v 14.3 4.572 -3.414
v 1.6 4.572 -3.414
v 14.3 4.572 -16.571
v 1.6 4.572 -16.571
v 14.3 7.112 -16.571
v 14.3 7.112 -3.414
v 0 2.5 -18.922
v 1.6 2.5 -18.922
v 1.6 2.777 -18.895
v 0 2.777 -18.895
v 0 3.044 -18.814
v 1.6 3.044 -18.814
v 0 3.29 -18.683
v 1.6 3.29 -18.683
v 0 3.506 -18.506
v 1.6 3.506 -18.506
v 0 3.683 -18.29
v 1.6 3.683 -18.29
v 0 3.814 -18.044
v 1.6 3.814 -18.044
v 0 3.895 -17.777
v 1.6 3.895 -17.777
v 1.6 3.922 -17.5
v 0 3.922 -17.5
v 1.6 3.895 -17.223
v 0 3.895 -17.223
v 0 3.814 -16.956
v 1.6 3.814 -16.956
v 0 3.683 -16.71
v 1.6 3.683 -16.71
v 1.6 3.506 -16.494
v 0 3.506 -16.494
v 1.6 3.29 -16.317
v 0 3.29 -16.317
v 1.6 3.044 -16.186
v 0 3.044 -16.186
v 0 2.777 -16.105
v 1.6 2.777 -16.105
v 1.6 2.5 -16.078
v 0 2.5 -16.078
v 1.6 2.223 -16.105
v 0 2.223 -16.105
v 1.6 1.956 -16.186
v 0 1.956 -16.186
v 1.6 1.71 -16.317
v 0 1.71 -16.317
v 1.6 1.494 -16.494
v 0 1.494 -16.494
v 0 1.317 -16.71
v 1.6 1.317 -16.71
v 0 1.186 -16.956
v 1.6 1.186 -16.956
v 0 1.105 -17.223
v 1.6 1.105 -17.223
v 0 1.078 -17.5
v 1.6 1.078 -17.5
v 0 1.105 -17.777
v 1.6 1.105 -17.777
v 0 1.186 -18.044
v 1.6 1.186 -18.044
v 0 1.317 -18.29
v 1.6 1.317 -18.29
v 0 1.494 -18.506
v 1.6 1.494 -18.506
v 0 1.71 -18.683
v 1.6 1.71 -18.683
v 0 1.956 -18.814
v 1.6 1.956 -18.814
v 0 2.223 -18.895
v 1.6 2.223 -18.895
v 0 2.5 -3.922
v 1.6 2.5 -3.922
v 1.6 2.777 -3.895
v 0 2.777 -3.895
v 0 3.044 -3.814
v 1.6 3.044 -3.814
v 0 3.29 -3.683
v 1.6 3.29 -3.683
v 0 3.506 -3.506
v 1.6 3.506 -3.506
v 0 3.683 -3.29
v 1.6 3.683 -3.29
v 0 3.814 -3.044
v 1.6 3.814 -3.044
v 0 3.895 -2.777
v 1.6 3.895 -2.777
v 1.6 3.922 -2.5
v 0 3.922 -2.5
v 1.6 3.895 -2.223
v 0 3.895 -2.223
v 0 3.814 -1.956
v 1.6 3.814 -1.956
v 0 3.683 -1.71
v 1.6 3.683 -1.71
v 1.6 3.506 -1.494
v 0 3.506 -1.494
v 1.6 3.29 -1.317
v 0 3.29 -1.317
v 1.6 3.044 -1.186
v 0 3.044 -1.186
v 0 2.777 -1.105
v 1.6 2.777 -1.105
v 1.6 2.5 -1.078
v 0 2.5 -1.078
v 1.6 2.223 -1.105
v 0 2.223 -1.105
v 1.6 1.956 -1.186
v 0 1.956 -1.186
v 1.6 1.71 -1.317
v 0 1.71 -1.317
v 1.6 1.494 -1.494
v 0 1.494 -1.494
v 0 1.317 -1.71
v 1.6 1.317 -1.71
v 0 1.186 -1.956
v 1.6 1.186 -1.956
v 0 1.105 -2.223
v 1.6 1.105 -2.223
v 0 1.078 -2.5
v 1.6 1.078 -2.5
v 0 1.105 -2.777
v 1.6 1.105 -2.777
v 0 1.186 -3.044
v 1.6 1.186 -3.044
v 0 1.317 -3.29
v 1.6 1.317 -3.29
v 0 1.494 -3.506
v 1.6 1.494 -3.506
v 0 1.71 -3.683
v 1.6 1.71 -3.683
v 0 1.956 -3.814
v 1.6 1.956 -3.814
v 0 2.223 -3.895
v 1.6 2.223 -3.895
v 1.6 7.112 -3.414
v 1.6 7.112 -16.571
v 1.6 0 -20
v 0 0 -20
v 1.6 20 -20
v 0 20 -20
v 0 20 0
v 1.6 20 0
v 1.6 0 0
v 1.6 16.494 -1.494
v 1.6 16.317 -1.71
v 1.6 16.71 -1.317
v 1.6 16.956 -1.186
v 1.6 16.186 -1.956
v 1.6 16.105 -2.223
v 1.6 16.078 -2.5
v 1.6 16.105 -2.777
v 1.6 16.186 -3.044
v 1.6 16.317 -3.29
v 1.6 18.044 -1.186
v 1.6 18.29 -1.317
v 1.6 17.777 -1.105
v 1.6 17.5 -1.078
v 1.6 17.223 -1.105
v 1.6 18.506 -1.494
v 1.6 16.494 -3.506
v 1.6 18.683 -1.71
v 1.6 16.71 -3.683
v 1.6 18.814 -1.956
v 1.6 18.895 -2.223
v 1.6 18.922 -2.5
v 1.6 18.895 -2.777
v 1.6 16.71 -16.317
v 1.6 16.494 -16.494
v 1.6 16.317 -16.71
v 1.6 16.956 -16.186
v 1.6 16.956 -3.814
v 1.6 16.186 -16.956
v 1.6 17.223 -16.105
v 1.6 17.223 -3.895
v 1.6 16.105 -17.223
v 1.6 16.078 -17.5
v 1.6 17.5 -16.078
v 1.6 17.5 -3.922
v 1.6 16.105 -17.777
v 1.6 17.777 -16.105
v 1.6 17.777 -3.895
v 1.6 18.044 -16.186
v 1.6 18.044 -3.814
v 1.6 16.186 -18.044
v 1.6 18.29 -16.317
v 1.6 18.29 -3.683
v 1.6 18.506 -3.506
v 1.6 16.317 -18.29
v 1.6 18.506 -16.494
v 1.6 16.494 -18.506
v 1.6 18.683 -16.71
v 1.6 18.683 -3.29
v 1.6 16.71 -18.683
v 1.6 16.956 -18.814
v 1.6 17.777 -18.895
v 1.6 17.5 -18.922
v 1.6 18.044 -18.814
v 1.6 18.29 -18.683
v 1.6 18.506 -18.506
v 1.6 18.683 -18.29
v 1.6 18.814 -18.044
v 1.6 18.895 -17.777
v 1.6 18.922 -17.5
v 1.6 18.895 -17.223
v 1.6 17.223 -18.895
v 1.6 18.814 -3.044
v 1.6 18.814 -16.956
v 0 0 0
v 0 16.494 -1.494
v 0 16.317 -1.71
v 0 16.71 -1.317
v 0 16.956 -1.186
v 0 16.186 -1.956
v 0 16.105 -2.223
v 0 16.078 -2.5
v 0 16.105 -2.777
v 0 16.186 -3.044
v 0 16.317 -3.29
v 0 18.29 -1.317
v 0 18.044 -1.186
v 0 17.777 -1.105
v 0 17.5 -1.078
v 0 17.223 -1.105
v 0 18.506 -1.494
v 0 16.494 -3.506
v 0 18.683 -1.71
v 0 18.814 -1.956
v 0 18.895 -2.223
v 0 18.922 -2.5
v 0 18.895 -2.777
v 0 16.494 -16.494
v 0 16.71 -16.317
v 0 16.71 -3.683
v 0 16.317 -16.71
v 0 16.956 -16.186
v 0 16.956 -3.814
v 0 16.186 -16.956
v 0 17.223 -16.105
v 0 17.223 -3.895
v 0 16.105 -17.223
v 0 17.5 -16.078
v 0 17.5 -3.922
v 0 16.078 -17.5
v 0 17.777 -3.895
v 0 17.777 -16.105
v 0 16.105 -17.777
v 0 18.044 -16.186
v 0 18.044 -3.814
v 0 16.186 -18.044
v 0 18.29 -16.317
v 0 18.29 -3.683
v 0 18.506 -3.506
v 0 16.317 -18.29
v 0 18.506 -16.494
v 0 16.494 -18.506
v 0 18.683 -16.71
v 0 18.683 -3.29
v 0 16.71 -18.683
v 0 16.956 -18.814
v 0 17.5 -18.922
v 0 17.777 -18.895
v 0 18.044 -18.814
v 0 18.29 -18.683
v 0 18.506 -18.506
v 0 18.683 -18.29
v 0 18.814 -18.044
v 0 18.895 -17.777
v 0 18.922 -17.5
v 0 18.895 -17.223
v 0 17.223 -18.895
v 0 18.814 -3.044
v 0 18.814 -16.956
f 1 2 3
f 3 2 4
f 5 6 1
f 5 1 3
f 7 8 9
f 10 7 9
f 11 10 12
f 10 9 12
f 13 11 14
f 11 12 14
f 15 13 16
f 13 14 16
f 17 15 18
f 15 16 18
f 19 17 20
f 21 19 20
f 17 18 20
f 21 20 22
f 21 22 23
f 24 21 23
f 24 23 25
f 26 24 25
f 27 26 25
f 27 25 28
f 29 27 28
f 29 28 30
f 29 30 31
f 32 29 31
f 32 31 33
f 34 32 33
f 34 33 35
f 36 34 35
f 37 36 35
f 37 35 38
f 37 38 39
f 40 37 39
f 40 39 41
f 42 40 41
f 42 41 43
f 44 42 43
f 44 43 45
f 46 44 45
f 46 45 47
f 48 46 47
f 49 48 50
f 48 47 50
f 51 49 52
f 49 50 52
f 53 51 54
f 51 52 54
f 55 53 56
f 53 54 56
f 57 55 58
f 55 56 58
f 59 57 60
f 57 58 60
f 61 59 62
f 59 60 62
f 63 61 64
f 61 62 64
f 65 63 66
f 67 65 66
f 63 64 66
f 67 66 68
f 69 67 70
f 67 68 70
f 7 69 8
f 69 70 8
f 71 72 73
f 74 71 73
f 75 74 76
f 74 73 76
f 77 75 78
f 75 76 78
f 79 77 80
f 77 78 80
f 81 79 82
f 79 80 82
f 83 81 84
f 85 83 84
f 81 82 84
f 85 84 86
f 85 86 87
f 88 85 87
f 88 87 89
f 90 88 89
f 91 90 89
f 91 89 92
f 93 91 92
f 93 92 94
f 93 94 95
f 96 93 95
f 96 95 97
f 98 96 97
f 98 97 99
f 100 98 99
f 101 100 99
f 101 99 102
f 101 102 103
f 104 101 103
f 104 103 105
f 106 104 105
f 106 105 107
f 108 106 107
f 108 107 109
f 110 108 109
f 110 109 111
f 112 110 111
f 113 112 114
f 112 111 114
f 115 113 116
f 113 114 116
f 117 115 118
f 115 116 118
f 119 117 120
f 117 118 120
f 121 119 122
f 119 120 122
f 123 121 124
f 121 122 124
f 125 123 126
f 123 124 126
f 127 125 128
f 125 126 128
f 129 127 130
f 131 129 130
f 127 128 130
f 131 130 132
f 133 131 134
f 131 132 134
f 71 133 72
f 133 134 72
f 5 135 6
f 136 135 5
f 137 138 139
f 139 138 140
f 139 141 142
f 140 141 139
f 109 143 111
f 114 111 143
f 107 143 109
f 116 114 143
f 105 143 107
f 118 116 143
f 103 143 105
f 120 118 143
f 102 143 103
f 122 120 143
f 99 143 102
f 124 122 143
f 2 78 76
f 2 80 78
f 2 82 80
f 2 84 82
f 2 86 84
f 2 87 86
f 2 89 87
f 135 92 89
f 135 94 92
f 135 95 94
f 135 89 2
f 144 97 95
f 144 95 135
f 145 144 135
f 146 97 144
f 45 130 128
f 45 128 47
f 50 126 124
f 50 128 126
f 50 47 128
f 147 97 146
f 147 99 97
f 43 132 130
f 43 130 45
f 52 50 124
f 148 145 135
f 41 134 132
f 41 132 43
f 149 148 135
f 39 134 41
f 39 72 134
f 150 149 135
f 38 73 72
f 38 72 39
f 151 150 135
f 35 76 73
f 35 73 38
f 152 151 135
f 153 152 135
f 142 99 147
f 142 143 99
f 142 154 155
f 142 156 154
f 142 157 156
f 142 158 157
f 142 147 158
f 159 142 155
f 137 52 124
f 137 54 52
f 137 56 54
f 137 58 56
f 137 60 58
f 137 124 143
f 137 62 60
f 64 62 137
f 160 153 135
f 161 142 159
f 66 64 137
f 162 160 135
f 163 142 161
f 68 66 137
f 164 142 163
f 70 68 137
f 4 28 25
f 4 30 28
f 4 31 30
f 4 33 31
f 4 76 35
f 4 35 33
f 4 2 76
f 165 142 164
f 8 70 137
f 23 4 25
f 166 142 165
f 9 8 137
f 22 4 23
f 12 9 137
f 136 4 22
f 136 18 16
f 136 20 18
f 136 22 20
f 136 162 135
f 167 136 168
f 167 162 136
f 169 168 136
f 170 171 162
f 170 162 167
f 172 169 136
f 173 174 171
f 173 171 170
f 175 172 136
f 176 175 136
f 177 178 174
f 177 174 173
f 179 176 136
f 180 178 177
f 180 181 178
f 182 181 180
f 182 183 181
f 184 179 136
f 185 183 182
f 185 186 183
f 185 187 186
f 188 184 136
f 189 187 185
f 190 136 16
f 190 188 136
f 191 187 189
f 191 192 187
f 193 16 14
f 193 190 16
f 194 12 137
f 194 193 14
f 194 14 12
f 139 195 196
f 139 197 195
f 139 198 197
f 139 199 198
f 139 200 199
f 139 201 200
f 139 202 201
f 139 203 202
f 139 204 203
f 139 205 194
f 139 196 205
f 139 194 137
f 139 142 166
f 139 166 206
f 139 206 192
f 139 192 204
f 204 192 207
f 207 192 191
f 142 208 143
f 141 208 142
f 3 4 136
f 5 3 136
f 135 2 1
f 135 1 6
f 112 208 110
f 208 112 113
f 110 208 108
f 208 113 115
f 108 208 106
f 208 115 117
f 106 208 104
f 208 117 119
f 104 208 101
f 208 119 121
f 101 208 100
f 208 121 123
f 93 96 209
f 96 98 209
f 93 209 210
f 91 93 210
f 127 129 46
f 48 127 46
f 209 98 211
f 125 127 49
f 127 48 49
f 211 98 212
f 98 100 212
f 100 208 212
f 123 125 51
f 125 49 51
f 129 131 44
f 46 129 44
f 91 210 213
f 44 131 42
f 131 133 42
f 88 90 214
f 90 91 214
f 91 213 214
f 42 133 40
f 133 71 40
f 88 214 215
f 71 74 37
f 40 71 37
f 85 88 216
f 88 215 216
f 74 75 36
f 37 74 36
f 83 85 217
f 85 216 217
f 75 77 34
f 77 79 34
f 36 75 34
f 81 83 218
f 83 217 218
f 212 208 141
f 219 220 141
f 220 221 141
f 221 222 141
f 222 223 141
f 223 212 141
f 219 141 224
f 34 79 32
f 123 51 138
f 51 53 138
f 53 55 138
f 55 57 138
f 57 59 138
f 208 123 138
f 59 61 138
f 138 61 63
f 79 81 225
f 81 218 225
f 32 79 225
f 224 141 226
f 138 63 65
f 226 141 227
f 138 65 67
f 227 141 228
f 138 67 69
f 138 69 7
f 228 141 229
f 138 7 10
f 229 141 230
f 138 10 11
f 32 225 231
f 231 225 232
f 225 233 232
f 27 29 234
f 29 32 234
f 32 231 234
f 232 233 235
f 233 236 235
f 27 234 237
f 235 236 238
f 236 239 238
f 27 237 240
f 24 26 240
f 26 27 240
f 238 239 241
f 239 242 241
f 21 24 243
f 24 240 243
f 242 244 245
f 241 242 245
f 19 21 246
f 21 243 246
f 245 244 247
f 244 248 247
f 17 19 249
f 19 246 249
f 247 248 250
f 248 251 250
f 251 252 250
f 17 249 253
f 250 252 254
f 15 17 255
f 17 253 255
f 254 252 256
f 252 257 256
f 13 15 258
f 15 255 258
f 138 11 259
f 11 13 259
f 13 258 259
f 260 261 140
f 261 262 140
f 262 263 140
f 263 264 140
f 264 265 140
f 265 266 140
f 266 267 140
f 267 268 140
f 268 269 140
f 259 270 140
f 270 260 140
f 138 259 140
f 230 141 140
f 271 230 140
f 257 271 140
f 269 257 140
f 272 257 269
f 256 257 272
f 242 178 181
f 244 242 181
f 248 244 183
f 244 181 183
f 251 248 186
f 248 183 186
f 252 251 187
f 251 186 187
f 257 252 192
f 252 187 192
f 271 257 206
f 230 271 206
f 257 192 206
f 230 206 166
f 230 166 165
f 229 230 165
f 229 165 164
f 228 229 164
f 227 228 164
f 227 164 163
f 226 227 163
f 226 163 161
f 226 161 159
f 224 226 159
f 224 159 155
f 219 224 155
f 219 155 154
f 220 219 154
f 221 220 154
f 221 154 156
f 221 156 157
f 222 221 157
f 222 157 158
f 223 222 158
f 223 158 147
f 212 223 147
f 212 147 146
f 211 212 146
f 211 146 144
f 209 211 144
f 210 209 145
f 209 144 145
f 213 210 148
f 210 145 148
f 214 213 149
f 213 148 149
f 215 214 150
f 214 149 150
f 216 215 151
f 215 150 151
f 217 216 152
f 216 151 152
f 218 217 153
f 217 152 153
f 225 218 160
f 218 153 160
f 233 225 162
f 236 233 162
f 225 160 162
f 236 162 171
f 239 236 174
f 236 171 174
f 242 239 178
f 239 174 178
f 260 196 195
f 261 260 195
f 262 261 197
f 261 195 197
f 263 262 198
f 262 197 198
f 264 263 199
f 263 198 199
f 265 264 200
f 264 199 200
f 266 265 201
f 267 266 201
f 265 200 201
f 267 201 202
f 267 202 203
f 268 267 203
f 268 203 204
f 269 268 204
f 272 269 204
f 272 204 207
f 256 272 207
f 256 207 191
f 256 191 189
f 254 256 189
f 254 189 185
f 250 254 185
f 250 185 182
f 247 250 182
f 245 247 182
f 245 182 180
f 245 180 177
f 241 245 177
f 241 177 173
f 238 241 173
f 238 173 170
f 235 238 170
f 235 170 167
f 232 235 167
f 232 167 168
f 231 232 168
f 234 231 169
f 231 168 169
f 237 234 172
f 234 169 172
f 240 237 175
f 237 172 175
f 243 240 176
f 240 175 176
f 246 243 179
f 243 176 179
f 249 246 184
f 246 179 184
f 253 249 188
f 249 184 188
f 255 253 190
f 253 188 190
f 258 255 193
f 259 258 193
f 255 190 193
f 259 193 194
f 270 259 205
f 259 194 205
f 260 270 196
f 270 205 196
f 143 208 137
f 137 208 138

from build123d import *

# Parameters (mm, degrees)
SKETCH1_W          = 20
SKETCH1_H          = 20
EXTRUDE1_DEPTH     = 1.6002
SKETCH2_R          = 1.4224
CUT_EXTRUDE1_DEPTH = 2.6002
SKETCH3_W          = 13.1572
SKETCH3_H          = 2.54
EXTRUDE2_DEPTH     = 12.7


with BuildPart() as part:
    # Sketch1 → Extrude1 (new body)
    with BuildSketch(Plane(origin=(0, 0, 0), x_dir=(0, 0, -1), z_dir=(1, 0, 0))):
        with Locations((10, 10)):
            Rectangle(SKETCH1_W, SKETCH1_H)
    extrude(amount=EXTRUDE1_DEPTH)

    # Sketch2 → Cut-Extrude1 (cut, through all)
    with BuildSketch(Plane(origin=(1.6002, 0, 0), x_dir=(0, 0, -1), z_dir=(1, 0, 0))):
        with Locations((2.5, 17.5)):
            Circle(SKETCH2_R)
        with Locations((17.5, 17.5)):
            Circle(SKETCH2_R)
        with Locations((17.5, 2.5)):
            Circle(SKETCH2_R)
        with Locations((2.5, 2.5)):
            Circle(SKETCH2_R)
    extrude(amount=-CUT_EXTRUDE1_DEPTH, mode=Mode.SUBTRACT)

    # Sketch3 → Extrude2 (add)
    with BuildSketch(Plane(origin=(1.6002, 0, 0), x_dir=(0, 0, -1), z_dir=(1, 0, 0))):
        with Locations((9.9924, 5.842)):
            Rectangle(SKETCH3_W, SKETCH3_H)
    extrude(amount=EXTRUDE2_DEPTH)


solid = part.part
